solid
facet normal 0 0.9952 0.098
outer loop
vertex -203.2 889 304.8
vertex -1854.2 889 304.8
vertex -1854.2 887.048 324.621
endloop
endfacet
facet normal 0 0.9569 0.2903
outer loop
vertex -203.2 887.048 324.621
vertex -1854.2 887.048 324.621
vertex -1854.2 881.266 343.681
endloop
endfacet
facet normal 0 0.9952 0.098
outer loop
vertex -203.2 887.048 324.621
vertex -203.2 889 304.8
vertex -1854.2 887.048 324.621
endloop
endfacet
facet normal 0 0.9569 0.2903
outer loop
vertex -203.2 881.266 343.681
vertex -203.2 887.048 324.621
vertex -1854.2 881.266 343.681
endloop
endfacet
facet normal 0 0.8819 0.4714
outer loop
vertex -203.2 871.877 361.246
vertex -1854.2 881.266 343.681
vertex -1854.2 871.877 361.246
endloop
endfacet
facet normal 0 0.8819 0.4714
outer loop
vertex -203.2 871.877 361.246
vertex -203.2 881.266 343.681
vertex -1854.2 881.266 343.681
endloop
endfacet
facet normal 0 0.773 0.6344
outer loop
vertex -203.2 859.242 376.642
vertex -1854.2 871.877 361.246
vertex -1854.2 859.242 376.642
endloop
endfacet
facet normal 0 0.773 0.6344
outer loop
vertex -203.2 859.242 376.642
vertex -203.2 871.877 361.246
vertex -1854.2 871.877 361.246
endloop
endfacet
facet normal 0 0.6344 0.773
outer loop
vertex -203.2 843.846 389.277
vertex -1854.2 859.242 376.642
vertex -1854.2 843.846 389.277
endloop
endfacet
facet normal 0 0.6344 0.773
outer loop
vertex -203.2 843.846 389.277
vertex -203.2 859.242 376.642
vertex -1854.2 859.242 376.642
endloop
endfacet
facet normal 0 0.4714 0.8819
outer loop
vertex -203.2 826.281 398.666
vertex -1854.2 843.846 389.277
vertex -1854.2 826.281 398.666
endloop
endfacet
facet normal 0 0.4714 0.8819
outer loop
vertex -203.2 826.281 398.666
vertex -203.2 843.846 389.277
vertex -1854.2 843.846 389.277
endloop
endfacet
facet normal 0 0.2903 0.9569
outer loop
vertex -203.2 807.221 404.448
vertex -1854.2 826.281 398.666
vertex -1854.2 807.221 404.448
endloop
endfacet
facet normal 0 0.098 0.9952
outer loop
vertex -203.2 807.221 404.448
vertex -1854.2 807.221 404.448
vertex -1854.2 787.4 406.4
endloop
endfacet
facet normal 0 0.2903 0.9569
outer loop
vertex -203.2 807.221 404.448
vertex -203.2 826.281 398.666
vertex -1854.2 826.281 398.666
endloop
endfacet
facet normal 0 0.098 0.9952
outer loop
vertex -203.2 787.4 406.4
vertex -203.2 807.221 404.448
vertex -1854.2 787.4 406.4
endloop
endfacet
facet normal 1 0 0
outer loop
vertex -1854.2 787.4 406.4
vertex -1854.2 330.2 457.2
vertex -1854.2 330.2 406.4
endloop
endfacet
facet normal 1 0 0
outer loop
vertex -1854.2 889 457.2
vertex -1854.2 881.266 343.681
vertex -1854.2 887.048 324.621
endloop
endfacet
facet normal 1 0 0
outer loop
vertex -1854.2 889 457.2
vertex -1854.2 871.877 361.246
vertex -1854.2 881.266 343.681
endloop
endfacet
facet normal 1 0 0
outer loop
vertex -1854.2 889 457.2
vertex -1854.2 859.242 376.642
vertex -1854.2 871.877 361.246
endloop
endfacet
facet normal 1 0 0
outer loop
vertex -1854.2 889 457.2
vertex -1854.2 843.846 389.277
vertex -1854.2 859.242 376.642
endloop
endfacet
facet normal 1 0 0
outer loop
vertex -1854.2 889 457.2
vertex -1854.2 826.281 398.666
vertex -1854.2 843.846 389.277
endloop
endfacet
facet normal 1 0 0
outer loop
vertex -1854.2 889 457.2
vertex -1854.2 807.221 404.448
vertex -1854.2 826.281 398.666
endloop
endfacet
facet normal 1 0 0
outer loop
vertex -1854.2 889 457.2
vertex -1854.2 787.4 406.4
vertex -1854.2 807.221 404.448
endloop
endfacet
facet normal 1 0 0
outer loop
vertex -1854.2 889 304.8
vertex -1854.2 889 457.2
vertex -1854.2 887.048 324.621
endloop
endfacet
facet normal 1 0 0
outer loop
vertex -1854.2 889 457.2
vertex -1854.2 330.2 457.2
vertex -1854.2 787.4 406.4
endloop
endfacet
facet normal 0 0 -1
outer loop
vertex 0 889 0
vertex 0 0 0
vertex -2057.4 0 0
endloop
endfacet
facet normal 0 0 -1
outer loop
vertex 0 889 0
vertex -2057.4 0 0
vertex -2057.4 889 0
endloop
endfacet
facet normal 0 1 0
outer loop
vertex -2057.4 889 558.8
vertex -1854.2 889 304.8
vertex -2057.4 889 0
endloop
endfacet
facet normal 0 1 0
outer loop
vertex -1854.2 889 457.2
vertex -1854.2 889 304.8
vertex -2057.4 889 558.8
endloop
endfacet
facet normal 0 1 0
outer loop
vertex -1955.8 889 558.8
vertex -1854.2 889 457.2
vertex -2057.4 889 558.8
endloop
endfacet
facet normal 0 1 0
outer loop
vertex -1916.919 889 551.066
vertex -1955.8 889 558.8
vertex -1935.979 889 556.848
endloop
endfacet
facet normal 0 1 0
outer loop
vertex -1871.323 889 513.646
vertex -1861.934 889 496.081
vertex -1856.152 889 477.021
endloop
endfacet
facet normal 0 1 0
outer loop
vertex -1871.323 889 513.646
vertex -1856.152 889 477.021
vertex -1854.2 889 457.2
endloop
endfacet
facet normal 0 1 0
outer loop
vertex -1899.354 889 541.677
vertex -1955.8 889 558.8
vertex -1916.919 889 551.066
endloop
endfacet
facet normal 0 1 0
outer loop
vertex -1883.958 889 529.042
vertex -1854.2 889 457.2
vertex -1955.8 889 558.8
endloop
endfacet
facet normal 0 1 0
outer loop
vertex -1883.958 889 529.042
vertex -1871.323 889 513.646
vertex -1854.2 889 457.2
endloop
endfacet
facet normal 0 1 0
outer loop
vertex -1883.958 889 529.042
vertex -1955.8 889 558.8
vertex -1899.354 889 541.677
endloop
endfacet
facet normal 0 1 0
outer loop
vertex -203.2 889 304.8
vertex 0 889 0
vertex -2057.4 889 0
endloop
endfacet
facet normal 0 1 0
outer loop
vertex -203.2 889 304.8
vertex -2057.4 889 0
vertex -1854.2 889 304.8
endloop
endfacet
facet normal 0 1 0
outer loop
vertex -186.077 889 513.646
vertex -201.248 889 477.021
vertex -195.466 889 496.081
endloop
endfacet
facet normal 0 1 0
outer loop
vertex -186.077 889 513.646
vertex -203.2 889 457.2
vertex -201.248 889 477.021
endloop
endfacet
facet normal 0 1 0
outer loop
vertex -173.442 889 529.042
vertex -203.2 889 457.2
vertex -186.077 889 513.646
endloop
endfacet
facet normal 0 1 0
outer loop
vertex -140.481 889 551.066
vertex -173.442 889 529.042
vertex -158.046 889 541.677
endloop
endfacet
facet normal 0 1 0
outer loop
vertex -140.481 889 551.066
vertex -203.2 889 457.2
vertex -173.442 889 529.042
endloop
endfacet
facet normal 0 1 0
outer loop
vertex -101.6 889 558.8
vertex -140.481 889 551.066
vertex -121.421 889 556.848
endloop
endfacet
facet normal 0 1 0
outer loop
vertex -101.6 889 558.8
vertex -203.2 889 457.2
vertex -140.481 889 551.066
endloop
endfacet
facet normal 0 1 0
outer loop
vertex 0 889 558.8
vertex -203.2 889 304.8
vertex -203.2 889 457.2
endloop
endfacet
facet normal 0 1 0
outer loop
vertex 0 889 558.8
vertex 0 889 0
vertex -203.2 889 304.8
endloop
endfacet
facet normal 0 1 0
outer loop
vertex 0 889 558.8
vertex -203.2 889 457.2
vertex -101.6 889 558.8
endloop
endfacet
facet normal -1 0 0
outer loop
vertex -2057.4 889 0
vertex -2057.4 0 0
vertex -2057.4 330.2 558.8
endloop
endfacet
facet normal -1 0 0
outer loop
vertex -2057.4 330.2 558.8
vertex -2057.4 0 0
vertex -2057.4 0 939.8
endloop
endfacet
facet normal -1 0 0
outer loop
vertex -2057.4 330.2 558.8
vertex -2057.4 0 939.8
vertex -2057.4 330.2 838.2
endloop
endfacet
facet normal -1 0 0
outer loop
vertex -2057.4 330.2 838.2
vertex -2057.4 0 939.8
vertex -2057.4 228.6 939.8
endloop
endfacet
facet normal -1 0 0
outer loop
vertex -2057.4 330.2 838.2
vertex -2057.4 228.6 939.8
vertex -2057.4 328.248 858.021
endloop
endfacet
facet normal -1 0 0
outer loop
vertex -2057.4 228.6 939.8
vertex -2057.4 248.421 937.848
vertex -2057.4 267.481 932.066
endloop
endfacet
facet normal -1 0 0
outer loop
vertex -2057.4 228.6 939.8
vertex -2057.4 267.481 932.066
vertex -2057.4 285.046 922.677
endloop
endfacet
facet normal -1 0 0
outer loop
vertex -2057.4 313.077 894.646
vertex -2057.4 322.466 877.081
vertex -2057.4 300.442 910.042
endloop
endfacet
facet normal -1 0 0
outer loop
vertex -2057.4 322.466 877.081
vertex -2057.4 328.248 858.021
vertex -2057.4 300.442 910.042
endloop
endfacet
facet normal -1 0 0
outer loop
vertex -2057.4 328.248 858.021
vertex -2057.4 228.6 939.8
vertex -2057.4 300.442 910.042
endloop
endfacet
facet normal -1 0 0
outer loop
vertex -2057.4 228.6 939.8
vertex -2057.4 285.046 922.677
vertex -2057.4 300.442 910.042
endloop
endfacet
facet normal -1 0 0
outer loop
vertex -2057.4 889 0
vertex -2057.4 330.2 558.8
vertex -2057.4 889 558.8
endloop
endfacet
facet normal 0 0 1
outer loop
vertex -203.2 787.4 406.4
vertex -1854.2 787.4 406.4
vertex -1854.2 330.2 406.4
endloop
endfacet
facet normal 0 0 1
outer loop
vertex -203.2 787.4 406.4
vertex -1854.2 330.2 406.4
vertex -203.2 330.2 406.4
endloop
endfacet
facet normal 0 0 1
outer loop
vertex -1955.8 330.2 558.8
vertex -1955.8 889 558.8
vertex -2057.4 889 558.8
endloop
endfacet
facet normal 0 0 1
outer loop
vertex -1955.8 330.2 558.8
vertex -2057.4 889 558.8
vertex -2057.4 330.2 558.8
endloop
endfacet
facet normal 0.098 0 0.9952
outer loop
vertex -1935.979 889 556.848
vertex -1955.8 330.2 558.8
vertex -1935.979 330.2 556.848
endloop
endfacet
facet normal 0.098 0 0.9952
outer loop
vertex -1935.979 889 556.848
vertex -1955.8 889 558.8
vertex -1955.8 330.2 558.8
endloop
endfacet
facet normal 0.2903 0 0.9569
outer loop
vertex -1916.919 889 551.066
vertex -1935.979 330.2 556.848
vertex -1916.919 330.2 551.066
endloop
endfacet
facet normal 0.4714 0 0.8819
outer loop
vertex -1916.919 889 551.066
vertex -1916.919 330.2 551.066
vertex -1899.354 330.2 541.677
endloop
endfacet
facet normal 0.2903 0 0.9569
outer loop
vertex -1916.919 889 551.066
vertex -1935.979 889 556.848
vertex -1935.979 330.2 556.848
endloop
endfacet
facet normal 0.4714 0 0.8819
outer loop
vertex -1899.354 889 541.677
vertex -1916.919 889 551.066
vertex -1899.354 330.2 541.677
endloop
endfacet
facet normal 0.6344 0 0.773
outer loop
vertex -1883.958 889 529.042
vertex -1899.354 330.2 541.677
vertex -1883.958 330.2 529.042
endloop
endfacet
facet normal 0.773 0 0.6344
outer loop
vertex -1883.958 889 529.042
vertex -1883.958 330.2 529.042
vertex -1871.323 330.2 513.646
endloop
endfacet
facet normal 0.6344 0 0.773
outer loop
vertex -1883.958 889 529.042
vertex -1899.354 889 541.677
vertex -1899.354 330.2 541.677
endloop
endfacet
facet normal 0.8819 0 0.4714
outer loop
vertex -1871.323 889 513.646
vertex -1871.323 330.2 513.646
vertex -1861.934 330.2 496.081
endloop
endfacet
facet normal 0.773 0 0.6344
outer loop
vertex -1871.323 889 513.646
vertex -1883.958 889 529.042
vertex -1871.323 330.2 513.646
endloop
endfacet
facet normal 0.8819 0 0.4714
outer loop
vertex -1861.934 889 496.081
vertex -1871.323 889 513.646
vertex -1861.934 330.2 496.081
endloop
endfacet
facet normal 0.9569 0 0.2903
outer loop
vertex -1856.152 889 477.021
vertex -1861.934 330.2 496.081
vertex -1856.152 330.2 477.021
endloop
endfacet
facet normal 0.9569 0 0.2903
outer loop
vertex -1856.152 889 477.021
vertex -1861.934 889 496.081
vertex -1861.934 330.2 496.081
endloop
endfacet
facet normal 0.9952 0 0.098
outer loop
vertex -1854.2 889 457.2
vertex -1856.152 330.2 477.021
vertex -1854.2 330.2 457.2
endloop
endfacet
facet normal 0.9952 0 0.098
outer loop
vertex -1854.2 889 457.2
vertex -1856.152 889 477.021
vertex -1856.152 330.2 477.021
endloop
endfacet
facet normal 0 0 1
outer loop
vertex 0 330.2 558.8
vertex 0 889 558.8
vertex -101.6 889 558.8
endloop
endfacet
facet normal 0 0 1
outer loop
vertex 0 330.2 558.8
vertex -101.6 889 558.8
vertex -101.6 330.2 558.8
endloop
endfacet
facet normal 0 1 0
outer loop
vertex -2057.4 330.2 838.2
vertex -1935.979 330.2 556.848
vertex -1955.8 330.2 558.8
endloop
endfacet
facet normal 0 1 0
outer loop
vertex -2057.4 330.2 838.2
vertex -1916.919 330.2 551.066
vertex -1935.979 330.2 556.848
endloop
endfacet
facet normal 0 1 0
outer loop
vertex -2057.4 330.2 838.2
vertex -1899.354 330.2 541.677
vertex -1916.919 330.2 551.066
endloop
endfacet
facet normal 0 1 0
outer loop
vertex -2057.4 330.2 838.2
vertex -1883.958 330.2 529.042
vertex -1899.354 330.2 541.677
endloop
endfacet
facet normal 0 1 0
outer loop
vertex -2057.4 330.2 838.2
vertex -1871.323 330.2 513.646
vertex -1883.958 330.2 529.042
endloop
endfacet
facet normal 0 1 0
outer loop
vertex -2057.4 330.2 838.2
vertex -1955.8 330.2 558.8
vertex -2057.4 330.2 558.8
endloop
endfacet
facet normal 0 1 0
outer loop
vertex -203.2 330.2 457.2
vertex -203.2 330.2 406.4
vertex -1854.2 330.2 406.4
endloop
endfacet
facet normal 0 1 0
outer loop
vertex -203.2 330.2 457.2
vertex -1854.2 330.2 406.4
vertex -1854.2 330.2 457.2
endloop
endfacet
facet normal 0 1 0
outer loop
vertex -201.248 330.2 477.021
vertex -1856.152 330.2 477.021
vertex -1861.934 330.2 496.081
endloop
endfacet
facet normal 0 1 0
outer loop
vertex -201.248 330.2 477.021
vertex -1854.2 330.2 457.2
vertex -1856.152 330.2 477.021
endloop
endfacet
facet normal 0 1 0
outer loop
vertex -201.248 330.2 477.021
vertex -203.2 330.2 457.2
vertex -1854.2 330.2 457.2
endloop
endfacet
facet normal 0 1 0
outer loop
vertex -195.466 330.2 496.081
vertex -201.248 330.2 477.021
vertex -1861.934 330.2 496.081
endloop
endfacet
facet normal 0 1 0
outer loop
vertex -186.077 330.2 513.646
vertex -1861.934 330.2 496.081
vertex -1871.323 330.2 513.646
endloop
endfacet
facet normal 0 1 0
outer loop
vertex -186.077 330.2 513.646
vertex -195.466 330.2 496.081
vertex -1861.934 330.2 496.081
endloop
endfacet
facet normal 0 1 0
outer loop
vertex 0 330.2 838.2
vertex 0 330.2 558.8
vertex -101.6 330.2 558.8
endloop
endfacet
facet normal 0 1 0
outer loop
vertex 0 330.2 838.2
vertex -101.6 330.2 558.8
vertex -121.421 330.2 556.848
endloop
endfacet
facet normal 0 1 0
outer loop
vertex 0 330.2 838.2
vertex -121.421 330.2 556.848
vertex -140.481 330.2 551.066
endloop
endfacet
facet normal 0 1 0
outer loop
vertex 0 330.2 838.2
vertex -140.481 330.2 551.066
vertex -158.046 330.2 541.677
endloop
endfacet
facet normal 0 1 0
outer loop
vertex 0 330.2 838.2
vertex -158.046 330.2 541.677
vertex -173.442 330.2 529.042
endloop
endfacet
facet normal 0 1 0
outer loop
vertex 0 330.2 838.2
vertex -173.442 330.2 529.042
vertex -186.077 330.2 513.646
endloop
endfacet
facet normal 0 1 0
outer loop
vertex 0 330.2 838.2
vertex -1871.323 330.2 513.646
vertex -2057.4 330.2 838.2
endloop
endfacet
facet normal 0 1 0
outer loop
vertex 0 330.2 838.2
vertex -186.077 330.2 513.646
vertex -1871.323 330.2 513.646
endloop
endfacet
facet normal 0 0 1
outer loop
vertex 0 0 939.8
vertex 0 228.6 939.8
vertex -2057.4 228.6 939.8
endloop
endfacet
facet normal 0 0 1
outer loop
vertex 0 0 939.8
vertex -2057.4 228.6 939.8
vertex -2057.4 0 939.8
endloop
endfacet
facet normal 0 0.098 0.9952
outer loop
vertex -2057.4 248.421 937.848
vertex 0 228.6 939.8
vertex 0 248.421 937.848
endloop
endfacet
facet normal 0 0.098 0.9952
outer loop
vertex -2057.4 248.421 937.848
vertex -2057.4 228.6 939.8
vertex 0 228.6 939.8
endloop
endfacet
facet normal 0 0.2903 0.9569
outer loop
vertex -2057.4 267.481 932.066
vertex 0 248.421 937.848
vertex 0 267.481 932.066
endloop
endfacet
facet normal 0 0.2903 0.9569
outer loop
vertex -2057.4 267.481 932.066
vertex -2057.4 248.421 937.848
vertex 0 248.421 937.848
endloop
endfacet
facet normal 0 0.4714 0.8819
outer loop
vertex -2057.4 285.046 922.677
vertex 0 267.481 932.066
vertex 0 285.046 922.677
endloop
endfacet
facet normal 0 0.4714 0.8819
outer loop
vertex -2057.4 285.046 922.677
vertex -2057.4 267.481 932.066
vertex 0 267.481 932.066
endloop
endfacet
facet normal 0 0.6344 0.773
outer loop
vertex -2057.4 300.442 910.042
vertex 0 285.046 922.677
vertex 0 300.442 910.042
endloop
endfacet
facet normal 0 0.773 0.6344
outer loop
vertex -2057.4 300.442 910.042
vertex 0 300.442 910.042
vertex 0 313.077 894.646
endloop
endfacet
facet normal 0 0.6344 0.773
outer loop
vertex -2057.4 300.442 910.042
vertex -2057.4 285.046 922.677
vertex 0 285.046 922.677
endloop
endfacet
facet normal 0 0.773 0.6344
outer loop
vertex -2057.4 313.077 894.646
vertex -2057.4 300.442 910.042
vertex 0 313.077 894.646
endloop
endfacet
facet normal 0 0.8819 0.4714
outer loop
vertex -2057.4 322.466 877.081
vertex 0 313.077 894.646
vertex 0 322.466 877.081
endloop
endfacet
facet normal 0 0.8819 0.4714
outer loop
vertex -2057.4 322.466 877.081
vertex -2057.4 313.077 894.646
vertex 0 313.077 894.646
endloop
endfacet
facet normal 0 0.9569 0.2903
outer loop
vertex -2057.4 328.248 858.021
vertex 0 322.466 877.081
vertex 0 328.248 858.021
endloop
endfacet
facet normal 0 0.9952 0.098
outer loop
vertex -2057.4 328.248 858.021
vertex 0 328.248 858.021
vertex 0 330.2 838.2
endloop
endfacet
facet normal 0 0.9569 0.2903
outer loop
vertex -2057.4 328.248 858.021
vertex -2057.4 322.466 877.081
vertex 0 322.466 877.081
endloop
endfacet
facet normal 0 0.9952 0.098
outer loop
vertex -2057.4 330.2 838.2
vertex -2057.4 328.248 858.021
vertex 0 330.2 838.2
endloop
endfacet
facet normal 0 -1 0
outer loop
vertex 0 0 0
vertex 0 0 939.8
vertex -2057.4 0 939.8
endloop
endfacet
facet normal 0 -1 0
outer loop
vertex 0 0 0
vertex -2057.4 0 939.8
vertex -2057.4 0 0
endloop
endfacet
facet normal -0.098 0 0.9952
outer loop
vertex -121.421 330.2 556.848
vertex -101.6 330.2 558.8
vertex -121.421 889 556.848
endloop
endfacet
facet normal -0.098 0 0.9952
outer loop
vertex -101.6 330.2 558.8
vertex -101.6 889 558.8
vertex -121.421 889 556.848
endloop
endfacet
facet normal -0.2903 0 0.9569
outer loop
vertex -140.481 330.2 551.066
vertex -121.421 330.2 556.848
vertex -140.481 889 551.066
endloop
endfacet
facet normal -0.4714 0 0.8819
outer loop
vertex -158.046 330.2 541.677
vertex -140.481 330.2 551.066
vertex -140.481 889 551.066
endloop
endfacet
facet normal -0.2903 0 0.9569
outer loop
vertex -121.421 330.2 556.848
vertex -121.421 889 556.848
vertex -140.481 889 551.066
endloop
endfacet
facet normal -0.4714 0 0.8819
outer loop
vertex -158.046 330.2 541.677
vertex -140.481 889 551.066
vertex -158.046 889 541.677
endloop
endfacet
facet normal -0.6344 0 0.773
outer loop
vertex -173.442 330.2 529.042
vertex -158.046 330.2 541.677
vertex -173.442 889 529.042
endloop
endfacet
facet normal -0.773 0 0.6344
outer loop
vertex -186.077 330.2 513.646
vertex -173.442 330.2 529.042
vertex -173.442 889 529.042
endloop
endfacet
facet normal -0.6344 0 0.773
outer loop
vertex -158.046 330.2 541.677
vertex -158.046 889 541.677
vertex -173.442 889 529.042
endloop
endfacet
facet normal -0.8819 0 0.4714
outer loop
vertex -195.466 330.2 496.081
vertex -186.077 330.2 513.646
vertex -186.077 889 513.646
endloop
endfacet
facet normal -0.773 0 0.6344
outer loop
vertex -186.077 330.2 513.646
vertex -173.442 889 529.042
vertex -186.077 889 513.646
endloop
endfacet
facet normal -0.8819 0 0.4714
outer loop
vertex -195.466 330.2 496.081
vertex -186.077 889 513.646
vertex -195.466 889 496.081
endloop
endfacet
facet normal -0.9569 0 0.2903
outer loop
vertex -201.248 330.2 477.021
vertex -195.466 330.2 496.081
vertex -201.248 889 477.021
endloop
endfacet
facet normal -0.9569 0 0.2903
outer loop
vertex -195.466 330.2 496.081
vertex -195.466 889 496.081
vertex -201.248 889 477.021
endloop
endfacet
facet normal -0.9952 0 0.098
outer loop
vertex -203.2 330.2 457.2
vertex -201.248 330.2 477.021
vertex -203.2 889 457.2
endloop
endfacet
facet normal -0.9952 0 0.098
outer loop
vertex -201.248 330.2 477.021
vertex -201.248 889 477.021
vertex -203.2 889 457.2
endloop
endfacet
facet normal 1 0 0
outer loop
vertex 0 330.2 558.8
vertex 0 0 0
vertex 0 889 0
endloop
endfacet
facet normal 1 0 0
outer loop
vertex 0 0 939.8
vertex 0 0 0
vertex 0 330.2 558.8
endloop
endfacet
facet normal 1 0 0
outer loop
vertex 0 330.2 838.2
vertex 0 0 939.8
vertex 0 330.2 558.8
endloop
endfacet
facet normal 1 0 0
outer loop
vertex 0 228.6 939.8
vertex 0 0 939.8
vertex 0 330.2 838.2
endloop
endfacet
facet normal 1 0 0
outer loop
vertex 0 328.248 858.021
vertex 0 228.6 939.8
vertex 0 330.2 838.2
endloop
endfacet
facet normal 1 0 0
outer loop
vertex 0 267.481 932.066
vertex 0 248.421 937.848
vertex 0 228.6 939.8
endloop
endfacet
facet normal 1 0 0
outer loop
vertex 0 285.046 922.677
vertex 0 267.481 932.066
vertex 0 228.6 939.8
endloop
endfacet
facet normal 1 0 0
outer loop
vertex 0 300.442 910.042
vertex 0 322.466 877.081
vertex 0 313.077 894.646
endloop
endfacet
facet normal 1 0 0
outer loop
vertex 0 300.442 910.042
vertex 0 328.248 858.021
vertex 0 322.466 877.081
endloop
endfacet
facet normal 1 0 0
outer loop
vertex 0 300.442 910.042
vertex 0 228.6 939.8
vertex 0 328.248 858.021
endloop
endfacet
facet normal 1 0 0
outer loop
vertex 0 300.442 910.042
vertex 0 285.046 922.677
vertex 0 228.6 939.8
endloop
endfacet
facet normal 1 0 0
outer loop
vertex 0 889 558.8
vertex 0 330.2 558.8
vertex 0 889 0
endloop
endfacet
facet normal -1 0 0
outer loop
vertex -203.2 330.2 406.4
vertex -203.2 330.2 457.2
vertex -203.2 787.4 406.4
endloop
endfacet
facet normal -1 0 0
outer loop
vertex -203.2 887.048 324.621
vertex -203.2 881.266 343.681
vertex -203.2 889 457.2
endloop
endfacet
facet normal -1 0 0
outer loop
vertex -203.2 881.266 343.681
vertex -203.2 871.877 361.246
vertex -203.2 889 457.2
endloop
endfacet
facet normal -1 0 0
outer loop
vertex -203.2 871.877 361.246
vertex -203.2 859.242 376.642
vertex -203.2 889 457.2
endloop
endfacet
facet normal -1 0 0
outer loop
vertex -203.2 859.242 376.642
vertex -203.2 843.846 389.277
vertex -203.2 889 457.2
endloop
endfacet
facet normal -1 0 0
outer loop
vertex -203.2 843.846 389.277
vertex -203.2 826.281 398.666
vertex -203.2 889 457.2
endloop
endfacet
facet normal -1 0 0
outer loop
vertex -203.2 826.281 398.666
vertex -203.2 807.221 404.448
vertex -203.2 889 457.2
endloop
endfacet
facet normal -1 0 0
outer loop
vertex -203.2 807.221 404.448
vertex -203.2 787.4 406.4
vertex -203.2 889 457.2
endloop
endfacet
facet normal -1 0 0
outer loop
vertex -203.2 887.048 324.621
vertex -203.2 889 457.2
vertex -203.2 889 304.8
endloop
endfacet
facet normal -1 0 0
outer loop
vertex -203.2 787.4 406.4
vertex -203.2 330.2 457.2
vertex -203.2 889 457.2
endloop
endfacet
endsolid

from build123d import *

# Parameters (mm, degrees)
F1_DEPTH = 2057.4
F2_W     = 1651
F2_H     = 558.8
F3_DEPTH = 152.4
F4_R     = 101.6


with BuildPart() as f1:
    # F0 (on Right) → F1 (new body)
    with BuildSketch(Plane.YZ):
        Polygon((0, 939.8), (0, 0), (889, 0), (889, 558.8), (330.2, 558.8), (330.2, 939.8), align=None)
    extrude(amount=-F1_DEPTH)

    # F2 (on face) → F3 (cut)
    with BuildSketch(Plane.XY.offset(558.8)):
        with Locations((-1028.7, 609.6)):
            Rectangle(F2_W, F2_H)
    extrude(amount=-F3_DEPTH, mode=Mode.SUBTRACT)

    # F4
    f4_edges = [f1.edges().sort_by_distance(p)[0] for p in [
        (-1028.7, 889, 406.4),
        (-1028.7, 330.2, 939.8),
        (-203.2, 609.6, 558.8),
        (-1854.2, 609.6, 558.8),
    ]]
    fillet(f4_edges, radius=F4_R)


solid = f1.part
